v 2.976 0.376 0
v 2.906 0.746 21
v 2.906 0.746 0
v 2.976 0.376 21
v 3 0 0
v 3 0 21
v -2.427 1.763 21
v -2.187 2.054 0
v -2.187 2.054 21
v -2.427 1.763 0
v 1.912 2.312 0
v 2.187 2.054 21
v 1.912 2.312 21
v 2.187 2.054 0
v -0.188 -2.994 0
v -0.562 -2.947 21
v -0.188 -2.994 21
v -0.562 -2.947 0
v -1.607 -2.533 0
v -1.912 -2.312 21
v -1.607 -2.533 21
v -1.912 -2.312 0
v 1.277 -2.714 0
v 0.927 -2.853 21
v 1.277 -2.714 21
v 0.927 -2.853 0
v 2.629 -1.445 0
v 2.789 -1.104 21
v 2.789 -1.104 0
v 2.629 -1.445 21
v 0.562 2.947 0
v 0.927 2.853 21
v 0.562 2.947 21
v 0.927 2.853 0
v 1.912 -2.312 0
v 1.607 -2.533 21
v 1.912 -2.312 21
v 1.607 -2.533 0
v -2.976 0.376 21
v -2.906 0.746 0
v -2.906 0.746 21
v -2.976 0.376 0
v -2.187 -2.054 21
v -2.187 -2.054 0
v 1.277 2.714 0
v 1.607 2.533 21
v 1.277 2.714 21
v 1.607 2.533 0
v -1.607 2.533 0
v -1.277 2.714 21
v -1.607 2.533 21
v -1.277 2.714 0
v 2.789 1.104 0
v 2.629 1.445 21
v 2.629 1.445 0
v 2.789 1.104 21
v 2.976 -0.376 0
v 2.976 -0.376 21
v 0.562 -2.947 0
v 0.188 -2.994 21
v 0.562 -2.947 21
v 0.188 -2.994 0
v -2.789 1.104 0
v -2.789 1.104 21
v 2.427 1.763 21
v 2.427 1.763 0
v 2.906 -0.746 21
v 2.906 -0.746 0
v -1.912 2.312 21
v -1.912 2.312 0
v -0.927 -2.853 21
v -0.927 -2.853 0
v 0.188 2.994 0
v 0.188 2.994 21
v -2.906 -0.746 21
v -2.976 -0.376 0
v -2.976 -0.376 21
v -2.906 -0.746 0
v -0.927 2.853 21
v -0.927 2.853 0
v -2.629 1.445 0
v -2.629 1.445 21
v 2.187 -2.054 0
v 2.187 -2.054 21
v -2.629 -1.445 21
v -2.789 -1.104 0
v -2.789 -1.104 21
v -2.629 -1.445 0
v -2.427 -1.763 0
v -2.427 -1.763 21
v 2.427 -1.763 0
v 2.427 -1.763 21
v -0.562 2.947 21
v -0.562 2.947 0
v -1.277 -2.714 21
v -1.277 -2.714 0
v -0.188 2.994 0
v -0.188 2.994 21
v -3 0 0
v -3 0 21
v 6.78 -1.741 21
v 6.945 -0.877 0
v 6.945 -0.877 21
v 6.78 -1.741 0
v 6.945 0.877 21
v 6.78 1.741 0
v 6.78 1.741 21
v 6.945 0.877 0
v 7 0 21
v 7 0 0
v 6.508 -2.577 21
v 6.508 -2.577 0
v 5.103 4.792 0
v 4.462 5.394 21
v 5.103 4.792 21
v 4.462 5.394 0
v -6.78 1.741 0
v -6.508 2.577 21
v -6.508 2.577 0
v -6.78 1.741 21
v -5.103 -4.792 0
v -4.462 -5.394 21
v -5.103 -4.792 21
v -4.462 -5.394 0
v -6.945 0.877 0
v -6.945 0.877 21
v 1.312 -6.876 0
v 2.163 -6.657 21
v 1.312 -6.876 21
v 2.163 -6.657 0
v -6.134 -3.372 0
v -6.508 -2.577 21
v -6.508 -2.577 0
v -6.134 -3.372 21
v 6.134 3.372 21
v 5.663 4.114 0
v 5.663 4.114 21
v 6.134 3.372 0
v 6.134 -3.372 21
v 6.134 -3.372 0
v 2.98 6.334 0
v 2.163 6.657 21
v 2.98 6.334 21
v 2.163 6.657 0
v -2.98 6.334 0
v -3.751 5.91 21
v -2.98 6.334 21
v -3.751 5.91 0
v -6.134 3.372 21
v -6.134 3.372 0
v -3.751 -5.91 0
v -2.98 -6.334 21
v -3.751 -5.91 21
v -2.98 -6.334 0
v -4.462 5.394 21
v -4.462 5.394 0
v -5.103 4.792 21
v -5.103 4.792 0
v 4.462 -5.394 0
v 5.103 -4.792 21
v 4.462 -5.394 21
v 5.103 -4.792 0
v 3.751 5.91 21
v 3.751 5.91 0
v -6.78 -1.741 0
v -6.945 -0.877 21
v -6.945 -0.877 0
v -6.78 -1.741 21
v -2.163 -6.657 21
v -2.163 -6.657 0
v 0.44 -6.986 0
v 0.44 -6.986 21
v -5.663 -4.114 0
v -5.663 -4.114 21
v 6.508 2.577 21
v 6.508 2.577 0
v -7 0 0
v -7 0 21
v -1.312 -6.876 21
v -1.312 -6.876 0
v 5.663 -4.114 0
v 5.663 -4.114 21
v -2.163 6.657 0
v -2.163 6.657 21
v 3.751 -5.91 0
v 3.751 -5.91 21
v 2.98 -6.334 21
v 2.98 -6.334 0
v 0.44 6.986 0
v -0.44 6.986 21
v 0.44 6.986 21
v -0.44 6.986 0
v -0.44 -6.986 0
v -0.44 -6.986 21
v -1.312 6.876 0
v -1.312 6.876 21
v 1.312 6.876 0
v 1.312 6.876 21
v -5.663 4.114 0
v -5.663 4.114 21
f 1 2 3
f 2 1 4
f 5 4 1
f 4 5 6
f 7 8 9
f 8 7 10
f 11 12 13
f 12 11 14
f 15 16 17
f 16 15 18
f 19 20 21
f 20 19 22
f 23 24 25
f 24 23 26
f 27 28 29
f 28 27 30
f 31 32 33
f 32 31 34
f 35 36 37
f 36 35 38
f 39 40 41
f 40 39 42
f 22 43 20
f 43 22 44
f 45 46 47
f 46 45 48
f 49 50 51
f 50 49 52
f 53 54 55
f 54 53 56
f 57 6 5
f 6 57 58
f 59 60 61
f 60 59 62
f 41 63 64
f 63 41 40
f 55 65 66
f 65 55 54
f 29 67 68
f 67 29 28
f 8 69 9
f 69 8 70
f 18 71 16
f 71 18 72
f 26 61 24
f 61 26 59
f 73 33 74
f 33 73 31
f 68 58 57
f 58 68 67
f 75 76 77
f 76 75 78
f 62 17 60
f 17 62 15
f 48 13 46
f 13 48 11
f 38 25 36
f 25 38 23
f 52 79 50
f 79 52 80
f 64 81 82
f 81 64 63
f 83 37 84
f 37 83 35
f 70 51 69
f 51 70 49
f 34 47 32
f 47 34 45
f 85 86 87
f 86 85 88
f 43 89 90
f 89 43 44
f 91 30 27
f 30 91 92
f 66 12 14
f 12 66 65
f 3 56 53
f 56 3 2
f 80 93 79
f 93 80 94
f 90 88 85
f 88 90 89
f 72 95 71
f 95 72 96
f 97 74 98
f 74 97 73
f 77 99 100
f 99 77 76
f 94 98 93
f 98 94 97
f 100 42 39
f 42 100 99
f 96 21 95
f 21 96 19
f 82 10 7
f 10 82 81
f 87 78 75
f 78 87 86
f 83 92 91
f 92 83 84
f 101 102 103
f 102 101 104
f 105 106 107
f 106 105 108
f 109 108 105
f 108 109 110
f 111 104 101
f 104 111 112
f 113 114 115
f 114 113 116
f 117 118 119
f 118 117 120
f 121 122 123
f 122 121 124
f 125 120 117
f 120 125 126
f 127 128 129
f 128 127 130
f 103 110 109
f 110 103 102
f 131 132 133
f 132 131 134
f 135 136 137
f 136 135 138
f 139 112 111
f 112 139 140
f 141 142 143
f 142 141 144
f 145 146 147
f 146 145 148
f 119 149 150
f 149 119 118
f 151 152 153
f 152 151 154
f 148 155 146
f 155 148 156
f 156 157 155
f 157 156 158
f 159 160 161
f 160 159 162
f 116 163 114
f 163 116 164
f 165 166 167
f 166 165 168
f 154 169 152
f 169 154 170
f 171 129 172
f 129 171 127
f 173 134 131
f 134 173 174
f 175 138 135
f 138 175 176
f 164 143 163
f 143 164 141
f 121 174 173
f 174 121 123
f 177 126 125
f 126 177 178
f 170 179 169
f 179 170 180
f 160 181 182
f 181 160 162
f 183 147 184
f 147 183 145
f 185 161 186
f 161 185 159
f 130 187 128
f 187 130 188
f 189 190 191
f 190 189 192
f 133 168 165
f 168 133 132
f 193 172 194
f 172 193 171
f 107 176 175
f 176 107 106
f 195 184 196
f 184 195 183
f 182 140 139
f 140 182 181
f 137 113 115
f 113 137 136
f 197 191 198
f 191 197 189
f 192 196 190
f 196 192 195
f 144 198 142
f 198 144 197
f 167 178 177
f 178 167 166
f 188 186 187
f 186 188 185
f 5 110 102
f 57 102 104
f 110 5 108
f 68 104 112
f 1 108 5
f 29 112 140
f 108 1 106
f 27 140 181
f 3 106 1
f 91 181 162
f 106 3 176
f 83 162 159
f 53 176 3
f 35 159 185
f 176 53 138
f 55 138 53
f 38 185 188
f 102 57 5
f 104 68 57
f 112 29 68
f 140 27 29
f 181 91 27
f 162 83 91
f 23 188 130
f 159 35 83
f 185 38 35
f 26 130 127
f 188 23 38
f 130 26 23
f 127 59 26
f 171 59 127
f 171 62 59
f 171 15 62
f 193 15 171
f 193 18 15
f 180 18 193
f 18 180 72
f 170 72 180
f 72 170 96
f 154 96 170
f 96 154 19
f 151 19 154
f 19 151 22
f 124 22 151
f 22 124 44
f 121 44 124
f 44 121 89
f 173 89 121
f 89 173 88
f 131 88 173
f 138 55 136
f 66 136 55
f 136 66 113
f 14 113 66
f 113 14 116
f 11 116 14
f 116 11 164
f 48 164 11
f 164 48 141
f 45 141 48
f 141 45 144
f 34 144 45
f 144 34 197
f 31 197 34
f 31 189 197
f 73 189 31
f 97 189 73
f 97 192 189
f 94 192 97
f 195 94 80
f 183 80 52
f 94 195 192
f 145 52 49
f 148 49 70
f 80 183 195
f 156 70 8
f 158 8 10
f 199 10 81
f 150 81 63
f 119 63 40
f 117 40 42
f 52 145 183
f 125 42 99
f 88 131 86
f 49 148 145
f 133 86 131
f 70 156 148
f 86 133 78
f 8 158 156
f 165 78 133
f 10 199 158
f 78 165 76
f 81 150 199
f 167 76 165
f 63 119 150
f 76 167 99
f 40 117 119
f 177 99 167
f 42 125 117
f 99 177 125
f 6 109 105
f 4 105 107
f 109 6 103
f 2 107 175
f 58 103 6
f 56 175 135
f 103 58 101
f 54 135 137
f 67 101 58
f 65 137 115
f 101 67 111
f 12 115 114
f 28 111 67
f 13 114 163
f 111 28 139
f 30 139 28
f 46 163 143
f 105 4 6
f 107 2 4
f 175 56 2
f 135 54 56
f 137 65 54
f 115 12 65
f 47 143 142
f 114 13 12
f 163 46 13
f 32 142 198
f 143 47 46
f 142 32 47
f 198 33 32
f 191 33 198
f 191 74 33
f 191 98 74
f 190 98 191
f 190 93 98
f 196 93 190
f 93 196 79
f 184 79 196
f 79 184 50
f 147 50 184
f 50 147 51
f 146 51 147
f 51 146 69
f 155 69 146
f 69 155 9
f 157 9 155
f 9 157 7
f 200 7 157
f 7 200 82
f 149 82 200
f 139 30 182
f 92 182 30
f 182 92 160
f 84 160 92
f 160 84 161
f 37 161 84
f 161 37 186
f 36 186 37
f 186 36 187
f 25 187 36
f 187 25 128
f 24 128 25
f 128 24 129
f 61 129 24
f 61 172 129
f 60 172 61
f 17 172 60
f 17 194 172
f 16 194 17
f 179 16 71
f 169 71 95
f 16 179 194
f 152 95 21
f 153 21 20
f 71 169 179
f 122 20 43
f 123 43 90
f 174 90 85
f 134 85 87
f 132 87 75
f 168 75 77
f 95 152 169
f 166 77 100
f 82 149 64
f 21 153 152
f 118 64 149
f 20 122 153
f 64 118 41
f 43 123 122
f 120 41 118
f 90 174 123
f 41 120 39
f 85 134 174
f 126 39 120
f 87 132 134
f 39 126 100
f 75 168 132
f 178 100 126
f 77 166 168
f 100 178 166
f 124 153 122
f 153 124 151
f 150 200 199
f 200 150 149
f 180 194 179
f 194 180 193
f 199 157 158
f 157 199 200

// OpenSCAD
$fn = 50;


difference() {
	union() {
		cylinder(h = 21, r = 7.0000000000);
	}
	union() {
		translate(v = [0.0000000000, 0.0000000000, -100.0000000000]) {
			cylinder(h = 200, r = 3.0000000000);
		}
		translate(v = [0.0000000000, 0.0000000000, -100.0000000000]) {
			cylinder(h = 200, r = 3.0000000000);
		}
		translate(v = [0.0000000000, 0.0000000000, -100.0000000000]) {
			cylinder(h = 200, r = 3.0000000000);
		}
		translate(v = [0.0000000000, 0.0000000000, -100.0000000000]) {
			cylinder(h = 200, r = 3.0000000000);
		}
	}
}
